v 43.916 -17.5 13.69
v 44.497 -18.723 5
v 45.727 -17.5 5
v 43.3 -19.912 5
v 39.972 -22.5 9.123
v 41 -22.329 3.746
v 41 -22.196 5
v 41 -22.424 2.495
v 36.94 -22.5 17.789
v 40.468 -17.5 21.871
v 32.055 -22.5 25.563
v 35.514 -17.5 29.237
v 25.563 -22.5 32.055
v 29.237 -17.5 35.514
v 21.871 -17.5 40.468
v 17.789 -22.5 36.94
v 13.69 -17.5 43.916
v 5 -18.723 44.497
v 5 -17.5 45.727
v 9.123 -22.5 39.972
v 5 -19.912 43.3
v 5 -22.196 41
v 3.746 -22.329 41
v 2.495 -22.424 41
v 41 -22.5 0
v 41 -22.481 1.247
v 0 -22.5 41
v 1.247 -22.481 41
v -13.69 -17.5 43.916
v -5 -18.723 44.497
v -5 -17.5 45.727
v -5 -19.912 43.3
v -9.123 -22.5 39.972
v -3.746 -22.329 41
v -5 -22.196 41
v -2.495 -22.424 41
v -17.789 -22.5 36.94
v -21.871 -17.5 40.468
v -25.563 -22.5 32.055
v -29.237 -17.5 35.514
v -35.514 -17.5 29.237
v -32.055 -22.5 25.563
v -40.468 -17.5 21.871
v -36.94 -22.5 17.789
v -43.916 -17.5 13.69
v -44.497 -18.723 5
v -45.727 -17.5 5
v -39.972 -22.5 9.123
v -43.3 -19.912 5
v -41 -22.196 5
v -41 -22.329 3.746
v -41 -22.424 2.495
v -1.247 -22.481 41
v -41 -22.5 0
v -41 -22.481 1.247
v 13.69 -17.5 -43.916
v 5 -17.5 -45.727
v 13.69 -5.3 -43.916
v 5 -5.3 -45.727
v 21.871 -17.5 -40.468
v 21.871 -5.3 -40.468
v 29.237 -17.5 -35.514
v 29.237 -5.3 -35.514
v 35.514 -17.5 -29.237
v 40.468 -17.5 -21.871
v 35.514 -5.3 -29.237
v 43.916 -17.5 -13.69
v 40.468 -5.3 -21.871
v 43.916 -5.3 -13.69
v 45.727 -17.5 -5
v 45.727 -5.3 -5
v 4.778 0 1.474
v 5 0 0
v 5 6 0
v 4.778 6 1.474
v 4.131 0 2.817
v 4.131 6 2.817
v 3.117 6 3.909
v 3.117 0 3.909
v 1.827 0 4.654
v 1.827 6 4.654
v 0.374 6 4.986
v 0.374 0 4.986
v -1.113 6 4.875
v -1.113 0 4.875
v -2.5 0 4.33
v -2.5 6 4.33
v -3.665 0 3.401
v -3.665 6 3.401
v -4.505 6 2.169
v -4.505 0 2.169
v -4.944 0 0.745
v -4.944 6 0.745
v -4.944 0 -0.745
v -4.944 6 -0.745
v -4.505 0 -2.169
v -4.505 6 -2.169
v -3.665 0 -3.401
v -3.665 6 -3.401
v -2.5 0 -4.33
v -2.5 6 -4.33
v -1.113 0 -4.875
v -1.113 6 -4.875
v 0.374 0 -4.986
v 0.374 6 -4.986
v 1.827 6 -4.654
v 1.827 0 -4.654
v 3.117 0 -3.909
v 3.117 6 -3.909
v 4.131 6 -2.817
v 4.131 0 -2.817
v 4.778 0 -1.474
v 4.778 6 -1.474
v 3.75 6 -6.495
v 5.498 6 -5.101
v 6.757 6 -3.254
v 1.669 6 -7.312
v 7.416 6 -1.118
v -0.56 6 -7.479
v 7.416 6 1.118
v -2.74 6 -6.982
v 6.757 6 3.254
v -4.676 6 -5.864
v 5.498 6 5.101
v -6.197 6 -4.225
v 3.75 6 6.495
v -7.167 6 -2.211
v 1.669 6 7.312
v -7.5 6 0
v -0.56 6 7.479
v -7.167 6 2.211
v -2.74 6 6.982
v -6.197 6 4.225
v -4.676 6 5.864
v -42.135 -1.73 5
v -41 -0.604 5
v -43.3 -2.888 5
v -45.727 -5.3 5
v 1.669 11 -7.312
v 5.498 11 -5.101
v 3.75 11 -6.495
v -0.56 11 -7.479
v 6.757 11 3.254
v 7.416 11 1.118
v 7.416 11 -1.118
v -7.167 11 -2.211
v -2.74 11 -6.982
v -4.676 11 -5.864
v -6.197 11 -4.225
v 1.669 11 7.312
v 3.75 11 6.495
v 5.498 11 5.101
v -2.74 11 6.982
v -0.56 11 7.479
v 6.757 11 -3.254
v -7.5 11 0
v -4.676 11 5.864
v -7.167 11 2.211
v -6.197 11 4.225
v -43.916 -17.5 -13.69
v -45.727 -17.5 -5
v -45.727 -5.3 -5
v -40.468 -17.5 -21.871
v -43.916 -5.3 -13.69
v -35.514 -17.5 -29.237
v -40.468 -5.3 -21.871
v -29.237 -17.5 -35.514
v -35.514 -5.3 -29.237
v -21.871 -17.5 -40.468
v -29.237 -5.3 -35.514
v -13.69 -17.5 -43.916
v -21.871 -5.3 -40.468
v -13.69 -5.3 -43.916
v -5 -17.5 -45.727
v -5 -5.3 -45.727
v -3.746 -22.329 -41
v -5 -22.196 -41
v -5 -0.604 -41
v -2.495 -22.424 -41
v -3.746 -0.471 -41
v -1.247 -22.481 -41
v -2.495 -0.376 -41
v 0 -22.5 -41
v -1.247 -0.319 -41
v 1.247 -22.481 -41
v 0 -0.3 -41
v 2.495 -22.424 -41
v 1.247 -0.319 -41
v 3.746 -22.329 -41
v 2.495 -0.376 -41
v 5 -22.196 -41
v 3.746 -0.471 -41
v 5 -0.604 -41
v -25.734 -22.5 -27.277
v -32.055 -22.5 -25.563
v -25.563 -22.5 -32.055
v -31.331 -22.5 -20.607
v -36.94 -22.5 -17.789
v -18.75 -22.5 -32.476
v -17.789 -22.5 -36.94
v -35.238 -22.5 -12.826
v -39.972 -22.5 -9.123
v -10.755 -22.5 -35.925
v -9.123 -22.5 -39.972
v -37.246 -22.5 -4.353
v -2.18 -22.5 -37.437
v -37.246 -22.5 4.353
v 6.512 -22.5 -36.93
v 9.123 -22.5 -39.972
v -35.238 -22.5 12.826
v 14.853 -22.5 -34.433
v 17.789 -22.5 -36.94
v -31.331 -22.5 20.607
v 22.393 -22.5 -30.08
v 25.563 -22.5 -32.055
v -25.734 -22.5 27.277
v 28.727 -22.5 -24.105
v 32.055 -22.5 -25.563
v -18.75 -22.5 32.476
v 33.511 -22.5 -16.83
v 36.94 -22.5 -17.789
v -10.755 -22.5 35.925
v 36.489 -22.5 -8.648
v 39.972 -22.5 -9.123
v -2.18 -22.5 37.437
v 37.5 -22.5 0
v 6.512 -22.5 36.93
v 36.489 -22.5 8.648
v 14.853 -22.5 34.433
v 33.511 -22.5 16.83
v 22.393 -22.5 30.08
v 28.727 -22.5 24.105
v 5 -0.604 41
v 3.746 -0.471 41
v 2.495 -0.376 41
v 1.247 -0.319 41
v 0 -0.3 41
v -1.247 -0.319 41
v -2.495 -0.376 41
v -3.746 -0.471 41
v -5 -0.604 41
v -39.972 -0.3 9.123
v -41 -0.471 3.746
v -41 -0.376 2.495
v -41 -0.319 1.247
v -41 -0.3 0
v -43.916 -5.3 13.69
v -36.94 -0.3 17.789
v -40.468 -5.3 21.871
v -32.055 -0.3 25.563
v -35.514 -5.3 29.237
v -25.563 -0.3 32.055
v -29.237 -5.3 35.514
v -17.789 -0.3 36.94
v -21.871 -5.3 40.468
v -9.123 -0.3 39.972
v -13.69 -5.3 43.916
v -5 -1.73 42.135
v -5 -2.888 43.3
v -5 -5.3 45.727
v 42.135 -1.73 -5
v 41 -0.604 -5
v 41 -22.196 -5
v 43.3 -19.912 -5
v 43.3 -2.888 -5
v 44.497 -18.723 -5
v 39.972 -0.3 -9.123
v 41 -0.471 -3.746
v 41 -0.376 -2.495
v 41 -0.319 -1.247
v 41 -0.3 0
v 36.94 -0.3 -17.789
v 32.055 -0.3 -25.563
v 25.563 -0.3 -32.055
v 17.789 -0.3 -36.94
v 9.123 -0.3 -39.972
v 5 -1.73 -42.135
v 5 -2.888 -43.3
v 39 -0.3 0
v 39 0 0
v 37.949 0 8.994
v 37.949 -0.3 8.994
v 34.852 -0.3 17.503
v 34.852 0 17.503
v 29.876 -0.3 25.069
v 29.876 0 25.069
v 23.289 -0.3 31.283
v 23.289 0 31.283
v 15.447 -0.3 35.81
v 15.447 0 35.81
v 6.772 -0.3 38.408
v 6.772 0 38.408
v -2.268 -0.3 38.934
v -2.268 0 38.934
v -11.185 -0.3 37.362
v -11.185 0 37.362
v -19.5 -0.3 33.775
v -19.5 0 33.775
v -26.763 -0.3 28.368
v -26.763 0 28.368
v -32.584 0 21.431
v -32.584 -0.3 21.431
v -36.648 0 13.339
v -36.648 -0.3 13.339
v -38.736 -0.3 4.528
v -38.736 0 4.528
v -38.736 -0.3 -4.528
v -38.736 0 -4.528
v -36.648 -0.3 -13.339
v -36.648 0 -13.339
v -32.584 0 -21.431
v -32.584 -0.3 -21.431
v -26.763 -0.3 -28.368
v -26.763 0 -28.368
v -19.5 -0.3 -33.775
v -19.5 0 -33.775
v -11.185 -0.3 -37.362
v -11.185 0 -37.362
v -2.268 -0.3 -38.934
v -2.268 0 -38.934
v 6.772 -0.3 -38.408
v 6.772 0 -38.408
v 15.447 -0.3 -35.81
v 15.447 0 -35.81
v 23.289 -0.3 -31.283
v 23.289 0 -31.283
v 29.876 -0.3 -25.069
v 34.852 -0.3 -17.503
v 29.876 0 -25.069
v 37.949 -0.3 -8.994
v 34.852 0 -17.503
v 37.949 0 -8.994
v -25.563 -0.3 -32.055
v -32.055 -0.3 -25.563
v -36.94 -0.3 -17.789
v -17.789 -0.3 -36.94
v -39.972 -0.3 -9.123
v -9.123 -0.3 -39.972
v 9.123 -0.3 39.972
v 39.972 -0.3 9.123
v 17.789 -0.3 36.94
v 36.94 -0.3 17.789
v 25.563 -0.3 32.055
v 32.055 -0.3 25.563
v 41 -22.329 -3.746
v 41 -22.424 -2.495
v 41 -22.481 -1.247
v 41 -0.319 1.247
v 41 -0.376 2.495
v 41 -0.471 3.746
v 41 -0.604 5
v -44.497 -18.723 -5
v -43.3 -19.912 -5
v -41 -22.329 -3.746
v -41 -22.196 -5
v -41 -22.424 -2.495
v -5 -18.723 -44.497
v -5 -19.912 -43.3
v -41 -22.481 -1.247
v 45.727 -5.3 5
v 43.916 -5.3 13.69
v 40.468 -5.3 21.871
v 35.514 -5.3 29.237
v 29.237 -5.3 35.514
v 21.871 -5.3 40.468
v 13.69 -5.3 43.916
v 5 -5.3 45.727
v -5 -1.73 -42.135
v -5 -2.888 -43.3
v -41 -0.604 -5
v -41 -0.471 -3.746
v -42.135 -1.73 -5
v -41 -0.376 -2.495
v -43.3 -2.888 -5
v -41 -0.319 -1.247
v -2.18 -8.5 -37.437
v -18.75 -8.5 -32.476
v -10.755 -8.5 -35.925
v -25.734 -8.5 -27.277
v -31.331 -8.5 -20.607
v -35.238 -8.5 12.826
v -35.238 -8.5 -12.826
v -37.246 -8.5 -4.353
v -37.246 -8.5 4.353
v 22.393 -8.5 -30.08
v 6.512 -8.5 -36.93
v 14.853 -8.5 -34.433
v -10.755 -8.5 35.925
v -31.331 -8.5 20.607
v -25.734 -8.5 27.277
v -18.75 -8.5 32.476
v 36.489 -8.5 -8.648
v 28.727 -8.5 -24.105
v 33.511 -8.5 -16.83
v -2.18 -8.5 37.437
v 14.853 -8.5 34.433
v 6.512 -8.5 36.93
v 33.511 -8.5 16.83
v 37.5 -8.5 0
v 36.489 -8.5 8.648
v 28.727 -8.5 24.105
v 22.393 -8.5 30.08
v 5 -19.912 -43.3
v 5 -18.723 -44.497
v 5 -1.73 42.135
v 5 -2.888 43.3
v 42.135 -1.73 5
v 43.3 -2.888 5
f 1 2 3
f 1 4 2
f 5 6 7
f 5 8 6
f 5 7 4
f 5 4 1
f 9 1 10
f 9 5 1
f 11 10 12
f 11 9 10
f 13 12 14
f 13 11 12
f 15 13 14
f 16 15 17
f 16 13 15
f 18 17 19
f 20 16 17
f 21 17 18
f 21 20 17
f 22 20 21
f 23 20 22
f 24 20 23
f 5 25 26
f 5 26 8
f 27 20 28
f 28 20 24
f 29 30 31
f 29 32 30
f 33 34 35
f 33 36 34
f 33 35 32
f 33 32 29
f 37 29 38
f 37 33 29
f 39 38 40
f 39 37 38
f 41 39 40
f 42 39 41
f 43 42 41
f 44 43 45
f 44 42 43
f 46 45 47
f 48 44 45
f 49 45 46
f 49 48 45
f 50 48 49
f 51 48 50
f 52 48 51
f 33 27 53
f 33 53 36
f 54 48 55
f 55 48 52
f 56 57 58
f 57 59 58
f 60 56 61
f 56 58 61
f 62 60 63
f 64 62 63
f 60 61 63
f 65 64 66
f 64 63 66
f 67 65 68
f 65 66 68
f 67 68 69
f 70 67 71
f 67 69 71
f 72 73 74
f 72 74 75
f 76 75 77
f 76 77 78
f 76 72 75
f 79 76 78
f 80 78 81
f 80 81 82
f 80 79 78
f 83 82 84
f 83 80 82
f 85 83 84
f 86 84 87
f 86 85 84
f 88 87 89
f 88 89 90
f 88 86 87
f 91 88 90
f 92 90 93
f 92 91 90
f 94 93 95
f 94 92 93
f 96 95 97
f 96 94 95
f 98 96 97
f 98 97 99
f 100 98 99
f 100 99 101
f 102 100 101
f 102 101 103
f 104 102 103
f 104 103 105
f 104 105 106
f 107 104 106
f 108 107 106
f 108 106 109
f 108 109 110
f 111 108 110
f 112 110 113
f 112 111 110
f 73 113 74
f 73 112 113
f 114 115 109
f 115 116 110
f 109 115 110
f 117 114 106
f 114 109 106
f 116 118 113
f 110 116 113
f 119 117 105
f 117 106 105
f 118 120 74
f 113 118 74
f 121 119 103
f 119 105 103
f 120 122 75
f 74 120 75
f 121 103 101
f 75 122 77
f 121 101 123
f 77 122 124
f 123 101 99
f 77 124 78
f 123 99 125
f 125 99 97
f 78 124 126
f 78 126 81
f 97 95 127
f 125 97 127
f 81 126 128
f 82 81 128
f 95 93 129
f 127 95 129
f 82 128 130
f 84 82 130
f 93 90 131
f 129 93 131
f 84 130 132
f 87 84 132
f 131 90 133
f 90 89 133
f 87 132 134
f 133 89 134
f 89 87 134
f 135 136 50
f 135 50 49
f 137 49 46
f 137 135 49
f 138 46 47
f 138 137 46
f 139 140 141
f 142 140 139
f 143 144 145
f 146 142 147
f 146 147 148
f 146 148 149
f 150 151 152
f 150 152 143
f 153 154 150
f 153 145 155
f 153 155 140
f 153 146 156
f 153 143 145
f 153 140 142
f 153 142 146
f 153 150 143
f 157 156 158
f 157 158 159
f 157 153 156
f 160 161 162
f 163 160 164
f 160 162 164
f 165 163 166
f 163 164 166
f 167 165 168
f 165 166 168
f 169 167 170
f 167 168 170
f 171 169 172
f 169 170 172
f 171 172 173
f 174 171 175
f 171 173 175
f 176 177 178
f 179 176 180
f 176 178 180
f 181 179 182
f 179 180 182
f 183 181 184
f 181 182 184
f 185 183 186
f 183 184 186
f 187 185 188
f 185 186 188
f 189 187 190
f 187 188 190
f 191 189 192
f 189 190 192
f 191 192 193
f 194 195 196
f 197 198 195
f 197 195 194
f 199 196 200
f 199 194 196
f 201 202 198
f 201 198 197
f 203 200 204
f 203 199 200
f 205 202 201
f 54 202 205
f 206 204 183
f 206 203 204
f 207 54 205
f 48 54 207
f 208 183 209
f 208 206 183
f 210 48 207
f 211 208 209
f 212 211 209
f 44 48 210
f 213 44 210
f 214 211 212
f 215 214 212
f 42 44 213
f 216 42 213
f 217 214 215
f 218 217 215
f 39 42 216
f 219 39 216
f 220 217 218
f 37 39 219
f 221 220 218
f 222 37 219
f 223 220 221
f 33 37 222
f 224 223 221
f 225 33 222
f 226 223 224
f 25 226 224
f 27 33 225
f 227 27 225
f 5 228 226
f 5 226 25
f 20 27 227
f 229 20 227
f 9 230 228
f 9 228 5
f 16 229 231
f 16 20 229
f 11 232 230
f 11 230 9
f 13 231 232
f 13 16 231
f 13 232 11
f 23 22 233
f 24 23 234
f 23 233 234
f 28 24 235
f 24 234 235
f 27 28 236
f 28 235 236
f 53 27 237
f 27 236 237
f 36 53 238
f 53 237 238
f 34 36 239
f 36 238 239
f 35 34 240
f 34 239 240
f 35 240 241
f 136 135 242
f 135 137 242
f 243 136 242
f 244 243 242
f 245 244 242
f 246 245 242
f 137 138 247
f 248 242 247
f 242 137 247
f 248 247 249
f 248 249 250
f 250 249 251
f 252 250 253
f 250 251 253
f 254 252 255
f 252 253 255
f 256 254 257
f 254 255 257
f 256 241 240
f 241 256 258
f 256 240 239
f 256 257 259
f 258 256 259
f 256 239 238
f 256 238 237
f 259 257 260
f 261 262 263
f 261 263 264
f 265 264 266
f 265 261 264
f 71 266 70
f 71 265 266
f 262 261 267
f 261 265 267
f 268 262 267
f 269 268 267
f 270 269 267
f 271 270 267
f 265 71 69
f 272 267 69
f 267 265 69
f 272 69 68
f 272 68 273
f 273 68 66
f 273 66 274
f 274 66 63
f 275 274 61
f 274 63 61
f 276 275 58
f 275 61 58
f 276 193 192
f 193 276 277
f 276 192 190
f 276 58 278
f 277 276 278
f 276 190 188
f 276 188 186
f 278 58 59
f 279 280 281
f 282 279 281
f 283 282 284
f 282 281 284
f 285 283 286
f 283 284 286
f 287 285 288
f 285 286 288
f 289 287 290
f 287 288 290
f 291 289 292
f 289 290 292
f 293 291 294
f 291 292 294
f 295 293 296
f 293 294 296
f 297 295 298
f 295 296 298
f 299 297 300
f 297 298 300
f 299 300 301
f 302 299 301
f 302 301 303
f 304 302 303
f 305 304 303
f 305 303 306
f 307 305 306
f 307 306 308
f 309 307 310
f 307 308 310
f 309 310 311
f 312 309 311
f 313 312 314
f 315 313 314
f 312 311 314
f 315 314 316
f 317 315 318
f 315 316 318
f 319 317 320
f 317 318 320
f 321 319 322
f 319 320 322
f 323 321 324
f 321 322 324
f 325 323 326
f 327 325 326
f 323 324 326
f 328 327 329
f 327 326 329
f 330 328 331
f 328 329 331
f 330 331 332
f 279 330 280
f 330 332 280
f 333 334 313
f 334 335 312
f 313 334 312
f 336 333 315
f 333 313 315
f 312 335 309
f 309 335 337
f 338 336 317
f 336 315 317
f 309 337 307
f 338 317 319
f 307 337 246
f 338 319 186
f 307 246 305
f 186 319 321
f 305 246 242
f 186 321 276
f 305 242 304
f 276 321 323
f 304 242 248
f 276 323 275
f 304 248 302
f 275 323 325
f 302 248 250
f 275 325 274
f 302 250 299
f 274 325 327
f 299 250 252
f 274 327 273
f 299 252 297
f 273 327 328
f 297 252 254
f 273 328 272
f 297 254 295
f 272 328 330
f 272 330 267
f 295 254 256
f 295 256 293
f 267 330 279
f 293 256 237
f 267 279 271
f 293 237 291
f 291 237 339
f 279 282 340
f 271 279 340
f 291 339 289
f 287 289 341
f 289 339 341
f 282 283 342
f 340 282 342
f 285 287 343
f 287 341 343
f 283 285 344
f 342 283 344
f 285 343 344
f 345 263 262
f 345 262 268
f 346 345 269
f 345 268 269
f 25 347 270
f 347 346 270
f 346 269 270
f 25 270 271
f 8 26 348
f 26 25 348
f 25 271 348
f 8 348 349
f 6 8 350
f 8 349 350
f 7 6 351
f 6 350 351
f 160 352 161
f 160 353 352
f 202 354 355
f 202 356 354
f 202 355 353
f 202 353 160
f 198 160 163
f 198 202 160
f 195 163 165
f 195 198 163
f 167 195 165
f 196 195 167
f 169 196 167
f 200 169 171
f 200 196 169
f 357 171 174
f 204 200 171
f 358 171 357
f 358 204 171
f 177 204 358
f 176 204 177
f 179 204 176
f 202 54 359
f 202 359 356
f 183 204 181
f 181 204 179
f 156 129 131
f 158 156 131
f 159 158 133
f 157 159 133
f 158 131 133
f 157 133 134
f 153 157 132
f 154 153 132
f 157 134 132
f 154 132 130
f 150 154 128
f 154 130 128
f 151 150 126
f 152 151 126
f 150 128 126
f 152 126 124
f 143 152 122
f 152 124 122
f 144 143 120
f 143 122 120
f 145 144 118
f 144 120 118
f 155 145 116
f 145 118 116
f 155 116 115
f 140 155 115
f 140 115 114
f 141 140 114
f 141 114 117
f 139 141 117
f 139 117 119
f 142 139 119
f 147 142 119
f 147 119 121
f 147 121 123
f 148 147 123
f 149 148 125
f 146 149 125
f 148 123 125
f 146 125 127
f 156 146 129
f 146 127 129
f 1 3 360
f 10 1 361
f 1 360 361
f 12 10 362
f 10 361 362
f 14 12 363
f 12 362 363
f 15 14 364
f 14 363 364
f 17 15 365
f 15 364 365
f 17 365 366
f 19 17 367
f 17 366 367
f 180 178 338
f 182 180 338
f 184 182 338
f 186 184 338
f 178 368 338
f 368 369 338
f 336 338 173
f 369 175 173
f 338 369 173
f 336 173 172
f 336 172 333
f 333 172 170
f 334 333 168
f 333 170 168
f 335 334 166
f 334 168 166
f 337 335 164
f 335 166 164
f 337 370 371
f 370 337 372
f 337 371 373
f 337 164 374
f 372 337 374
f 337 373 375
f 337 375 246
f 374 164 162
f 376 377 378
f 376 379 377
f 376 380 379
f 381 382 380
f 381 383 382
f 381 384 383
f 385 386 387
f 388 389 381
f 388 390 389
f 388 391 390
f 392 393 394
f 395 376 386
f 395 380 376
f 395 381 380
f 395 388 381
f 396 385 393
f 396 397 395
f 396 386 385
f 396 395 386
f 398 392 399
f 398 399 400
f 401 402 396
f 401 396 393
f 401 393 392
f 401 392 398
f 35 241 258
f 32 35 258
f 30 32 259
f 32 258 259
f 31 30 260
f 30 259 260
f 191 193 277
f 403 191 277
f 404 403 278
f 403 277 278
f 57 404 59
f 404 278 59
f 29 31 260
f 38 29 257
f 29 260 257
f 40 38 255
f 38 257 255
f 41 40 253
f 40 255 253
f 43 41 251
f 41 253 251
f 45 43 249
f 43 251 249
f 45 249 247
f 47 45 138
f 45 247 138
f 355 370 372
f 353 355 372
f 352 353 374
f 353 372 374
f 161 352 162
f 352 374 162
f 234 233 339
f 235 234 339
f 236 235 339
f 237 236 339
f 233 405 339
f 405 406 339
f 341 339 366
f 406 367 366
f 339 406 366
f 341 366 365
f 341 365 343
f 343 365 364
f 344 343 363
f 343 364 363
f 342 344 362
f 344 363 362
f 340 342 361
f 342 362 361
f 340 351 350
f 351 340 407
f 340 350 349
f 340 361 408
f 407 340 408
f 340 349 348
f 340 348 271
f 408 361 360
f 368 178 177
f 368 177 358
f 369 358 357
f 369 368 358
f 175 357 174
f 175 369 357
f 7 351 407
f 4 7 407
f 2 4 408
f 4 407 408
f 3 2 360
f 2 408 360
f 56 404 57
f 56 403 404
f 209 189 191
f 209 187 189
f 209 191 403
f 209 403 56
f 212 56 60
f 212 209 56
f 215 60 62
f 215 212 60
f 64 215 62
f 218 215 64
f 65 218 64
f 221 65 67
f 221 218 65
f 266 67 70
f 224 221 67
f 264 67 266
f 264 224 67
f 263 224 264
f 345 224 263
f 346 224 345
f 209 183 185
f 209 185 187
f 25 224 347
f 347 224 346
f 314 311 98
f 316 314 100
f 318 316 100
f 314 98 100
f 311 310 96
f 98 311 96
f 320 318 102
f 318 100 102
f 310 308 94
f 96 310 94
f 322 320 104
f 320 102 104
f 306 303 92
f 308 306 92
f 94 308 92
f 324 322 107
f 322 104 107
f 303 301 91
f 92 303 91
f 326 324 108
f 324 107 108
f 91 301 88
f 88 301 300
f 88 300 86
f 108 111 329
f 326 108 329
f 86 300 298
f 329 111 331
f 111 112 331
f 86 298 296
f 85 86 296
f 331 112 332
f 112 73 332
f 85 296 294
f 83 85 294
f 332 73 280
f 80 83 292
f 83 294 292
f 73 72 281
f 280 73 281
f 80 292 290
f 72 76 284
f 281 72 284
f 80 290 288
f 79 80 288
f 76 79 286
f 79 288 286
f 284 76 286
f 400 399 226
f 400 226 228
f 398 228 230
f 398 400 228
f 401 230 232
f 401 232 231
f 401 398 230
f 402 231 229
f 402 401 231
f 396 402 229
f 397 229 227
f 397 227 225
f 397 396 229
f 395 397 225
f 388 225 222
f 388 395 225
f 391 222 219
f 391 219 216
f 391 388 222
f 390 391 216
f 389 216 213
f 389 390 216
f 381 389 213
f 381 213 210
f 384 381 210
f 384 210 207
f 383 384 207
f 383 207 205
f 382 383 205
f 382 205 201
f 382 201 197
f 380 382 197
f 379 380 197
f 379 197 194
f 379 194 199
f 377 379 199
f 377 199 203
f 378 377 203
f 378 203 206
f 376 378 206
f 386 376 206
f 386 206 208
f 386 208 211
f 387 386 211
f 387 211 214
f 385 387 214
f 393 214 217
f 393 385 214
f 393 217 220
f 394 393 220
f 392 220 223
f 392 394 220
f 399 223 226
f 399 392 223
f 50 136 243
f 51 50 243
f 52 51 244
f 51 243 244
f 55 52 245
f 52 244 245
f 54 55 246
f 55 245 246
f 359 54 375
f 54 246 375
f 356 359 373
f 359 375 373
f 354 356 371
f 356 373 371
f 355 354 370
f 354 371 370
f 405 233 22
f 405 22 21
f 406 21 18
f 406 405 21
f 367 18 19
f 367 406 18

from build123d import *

# Parameters (mm, degrees)
F0_R             = 46
F1_DEPTH         = 22.5
F2_T             = -8.5
F3_R             = 55.4976575172
F3_R_2           = 39
F4_DEPTH         = 0.3
F5_R             = 5
F6_DEPTH         = 6
F7_R             = 7.5
F7_R_2           = 5
F8_DEPTH         = 5
F9_SIZE2         = 5
F9_SIZE          = 5
F10_W            = 11.5703346615
F10_H            = 10
F11_DEPTH        = 22.501
F11_COPIES_COUNT = 4


# Not quite as in the source:
# - a pattern or mirror of a feature is missing from the dataset's text; its kind, count and spacing are read off the source's solid


with BuildPart() as f1:
    # F0 (on Front) → F1 (new body)
    with BuildSketch(Plane.XZ):
        Circle(F0_R)
    extrude(amount=F1_DEPTH)

    # F2
    f2_openings = [f1.faces().sort_by_distance(p)[0] for p in [
        (0, -22.5, 0),
    ]]
    offset(amount=F2_T, openings=f2_openings)

    # F3 (on Front) → F4 (cut)
    with BuildSketch(Plane.XZ):
        Circle(F3_R)
        Circle(F3_R_2, mode=Mode.SUBTRACT)
    extrude(amount=F4_DEPTH, mode=Mode.SUBTRACT)

    # F5 (on Front) → F6 (join)
    with BuildSketch(Plane.XZ):
        Circle(F5_R)
    extrude(amount=-F6_DEPTH)

    # F7 (on face) → F8 (join)
    with BuildSketch(Plane(origin=(0, 6, 0), x_dir=(-1, 0, 0), z_dir=(0, 1, 0))):
        Circle(F7_R)
        Circle(F7_R_2, mode=Mode.SUBTRACT)
        Circle(F7_R_2)
    extrude(amount=F8_DEPTH)

    # F9
    f9_edges = [f1.edges().sort_by_distance(p)[0] for p in [
        (-46, -0.3, 0),
        (-46, -22.5, 0),
    ]]
    chamfer(f9_edges, length=F9_SIZE, length2=F9_SIZE2)

    # F10 (on Front) → F11 (cut, through all)
    with BuildSketch(Plane.XZ):
        with Locations((46.7851673308, 0)):
            Rectangle(F10_W, F10_H)
    f11 = extrude(amount=F11_DEPTH, mode=Mode.SUBTRACT)

    # F11_copies: F11 ×4 about axis
    f11_copies_axis = Axis((0, 0, 0), (0, 1, 0))
    for i in range(1, F11_COPIES_COUNT):
        add(f11.rotate(f11_copies_axis, i * 360 / F11_COPIES_COUNT), mode=Mode.SUBTRACT)


solid = f1.part
